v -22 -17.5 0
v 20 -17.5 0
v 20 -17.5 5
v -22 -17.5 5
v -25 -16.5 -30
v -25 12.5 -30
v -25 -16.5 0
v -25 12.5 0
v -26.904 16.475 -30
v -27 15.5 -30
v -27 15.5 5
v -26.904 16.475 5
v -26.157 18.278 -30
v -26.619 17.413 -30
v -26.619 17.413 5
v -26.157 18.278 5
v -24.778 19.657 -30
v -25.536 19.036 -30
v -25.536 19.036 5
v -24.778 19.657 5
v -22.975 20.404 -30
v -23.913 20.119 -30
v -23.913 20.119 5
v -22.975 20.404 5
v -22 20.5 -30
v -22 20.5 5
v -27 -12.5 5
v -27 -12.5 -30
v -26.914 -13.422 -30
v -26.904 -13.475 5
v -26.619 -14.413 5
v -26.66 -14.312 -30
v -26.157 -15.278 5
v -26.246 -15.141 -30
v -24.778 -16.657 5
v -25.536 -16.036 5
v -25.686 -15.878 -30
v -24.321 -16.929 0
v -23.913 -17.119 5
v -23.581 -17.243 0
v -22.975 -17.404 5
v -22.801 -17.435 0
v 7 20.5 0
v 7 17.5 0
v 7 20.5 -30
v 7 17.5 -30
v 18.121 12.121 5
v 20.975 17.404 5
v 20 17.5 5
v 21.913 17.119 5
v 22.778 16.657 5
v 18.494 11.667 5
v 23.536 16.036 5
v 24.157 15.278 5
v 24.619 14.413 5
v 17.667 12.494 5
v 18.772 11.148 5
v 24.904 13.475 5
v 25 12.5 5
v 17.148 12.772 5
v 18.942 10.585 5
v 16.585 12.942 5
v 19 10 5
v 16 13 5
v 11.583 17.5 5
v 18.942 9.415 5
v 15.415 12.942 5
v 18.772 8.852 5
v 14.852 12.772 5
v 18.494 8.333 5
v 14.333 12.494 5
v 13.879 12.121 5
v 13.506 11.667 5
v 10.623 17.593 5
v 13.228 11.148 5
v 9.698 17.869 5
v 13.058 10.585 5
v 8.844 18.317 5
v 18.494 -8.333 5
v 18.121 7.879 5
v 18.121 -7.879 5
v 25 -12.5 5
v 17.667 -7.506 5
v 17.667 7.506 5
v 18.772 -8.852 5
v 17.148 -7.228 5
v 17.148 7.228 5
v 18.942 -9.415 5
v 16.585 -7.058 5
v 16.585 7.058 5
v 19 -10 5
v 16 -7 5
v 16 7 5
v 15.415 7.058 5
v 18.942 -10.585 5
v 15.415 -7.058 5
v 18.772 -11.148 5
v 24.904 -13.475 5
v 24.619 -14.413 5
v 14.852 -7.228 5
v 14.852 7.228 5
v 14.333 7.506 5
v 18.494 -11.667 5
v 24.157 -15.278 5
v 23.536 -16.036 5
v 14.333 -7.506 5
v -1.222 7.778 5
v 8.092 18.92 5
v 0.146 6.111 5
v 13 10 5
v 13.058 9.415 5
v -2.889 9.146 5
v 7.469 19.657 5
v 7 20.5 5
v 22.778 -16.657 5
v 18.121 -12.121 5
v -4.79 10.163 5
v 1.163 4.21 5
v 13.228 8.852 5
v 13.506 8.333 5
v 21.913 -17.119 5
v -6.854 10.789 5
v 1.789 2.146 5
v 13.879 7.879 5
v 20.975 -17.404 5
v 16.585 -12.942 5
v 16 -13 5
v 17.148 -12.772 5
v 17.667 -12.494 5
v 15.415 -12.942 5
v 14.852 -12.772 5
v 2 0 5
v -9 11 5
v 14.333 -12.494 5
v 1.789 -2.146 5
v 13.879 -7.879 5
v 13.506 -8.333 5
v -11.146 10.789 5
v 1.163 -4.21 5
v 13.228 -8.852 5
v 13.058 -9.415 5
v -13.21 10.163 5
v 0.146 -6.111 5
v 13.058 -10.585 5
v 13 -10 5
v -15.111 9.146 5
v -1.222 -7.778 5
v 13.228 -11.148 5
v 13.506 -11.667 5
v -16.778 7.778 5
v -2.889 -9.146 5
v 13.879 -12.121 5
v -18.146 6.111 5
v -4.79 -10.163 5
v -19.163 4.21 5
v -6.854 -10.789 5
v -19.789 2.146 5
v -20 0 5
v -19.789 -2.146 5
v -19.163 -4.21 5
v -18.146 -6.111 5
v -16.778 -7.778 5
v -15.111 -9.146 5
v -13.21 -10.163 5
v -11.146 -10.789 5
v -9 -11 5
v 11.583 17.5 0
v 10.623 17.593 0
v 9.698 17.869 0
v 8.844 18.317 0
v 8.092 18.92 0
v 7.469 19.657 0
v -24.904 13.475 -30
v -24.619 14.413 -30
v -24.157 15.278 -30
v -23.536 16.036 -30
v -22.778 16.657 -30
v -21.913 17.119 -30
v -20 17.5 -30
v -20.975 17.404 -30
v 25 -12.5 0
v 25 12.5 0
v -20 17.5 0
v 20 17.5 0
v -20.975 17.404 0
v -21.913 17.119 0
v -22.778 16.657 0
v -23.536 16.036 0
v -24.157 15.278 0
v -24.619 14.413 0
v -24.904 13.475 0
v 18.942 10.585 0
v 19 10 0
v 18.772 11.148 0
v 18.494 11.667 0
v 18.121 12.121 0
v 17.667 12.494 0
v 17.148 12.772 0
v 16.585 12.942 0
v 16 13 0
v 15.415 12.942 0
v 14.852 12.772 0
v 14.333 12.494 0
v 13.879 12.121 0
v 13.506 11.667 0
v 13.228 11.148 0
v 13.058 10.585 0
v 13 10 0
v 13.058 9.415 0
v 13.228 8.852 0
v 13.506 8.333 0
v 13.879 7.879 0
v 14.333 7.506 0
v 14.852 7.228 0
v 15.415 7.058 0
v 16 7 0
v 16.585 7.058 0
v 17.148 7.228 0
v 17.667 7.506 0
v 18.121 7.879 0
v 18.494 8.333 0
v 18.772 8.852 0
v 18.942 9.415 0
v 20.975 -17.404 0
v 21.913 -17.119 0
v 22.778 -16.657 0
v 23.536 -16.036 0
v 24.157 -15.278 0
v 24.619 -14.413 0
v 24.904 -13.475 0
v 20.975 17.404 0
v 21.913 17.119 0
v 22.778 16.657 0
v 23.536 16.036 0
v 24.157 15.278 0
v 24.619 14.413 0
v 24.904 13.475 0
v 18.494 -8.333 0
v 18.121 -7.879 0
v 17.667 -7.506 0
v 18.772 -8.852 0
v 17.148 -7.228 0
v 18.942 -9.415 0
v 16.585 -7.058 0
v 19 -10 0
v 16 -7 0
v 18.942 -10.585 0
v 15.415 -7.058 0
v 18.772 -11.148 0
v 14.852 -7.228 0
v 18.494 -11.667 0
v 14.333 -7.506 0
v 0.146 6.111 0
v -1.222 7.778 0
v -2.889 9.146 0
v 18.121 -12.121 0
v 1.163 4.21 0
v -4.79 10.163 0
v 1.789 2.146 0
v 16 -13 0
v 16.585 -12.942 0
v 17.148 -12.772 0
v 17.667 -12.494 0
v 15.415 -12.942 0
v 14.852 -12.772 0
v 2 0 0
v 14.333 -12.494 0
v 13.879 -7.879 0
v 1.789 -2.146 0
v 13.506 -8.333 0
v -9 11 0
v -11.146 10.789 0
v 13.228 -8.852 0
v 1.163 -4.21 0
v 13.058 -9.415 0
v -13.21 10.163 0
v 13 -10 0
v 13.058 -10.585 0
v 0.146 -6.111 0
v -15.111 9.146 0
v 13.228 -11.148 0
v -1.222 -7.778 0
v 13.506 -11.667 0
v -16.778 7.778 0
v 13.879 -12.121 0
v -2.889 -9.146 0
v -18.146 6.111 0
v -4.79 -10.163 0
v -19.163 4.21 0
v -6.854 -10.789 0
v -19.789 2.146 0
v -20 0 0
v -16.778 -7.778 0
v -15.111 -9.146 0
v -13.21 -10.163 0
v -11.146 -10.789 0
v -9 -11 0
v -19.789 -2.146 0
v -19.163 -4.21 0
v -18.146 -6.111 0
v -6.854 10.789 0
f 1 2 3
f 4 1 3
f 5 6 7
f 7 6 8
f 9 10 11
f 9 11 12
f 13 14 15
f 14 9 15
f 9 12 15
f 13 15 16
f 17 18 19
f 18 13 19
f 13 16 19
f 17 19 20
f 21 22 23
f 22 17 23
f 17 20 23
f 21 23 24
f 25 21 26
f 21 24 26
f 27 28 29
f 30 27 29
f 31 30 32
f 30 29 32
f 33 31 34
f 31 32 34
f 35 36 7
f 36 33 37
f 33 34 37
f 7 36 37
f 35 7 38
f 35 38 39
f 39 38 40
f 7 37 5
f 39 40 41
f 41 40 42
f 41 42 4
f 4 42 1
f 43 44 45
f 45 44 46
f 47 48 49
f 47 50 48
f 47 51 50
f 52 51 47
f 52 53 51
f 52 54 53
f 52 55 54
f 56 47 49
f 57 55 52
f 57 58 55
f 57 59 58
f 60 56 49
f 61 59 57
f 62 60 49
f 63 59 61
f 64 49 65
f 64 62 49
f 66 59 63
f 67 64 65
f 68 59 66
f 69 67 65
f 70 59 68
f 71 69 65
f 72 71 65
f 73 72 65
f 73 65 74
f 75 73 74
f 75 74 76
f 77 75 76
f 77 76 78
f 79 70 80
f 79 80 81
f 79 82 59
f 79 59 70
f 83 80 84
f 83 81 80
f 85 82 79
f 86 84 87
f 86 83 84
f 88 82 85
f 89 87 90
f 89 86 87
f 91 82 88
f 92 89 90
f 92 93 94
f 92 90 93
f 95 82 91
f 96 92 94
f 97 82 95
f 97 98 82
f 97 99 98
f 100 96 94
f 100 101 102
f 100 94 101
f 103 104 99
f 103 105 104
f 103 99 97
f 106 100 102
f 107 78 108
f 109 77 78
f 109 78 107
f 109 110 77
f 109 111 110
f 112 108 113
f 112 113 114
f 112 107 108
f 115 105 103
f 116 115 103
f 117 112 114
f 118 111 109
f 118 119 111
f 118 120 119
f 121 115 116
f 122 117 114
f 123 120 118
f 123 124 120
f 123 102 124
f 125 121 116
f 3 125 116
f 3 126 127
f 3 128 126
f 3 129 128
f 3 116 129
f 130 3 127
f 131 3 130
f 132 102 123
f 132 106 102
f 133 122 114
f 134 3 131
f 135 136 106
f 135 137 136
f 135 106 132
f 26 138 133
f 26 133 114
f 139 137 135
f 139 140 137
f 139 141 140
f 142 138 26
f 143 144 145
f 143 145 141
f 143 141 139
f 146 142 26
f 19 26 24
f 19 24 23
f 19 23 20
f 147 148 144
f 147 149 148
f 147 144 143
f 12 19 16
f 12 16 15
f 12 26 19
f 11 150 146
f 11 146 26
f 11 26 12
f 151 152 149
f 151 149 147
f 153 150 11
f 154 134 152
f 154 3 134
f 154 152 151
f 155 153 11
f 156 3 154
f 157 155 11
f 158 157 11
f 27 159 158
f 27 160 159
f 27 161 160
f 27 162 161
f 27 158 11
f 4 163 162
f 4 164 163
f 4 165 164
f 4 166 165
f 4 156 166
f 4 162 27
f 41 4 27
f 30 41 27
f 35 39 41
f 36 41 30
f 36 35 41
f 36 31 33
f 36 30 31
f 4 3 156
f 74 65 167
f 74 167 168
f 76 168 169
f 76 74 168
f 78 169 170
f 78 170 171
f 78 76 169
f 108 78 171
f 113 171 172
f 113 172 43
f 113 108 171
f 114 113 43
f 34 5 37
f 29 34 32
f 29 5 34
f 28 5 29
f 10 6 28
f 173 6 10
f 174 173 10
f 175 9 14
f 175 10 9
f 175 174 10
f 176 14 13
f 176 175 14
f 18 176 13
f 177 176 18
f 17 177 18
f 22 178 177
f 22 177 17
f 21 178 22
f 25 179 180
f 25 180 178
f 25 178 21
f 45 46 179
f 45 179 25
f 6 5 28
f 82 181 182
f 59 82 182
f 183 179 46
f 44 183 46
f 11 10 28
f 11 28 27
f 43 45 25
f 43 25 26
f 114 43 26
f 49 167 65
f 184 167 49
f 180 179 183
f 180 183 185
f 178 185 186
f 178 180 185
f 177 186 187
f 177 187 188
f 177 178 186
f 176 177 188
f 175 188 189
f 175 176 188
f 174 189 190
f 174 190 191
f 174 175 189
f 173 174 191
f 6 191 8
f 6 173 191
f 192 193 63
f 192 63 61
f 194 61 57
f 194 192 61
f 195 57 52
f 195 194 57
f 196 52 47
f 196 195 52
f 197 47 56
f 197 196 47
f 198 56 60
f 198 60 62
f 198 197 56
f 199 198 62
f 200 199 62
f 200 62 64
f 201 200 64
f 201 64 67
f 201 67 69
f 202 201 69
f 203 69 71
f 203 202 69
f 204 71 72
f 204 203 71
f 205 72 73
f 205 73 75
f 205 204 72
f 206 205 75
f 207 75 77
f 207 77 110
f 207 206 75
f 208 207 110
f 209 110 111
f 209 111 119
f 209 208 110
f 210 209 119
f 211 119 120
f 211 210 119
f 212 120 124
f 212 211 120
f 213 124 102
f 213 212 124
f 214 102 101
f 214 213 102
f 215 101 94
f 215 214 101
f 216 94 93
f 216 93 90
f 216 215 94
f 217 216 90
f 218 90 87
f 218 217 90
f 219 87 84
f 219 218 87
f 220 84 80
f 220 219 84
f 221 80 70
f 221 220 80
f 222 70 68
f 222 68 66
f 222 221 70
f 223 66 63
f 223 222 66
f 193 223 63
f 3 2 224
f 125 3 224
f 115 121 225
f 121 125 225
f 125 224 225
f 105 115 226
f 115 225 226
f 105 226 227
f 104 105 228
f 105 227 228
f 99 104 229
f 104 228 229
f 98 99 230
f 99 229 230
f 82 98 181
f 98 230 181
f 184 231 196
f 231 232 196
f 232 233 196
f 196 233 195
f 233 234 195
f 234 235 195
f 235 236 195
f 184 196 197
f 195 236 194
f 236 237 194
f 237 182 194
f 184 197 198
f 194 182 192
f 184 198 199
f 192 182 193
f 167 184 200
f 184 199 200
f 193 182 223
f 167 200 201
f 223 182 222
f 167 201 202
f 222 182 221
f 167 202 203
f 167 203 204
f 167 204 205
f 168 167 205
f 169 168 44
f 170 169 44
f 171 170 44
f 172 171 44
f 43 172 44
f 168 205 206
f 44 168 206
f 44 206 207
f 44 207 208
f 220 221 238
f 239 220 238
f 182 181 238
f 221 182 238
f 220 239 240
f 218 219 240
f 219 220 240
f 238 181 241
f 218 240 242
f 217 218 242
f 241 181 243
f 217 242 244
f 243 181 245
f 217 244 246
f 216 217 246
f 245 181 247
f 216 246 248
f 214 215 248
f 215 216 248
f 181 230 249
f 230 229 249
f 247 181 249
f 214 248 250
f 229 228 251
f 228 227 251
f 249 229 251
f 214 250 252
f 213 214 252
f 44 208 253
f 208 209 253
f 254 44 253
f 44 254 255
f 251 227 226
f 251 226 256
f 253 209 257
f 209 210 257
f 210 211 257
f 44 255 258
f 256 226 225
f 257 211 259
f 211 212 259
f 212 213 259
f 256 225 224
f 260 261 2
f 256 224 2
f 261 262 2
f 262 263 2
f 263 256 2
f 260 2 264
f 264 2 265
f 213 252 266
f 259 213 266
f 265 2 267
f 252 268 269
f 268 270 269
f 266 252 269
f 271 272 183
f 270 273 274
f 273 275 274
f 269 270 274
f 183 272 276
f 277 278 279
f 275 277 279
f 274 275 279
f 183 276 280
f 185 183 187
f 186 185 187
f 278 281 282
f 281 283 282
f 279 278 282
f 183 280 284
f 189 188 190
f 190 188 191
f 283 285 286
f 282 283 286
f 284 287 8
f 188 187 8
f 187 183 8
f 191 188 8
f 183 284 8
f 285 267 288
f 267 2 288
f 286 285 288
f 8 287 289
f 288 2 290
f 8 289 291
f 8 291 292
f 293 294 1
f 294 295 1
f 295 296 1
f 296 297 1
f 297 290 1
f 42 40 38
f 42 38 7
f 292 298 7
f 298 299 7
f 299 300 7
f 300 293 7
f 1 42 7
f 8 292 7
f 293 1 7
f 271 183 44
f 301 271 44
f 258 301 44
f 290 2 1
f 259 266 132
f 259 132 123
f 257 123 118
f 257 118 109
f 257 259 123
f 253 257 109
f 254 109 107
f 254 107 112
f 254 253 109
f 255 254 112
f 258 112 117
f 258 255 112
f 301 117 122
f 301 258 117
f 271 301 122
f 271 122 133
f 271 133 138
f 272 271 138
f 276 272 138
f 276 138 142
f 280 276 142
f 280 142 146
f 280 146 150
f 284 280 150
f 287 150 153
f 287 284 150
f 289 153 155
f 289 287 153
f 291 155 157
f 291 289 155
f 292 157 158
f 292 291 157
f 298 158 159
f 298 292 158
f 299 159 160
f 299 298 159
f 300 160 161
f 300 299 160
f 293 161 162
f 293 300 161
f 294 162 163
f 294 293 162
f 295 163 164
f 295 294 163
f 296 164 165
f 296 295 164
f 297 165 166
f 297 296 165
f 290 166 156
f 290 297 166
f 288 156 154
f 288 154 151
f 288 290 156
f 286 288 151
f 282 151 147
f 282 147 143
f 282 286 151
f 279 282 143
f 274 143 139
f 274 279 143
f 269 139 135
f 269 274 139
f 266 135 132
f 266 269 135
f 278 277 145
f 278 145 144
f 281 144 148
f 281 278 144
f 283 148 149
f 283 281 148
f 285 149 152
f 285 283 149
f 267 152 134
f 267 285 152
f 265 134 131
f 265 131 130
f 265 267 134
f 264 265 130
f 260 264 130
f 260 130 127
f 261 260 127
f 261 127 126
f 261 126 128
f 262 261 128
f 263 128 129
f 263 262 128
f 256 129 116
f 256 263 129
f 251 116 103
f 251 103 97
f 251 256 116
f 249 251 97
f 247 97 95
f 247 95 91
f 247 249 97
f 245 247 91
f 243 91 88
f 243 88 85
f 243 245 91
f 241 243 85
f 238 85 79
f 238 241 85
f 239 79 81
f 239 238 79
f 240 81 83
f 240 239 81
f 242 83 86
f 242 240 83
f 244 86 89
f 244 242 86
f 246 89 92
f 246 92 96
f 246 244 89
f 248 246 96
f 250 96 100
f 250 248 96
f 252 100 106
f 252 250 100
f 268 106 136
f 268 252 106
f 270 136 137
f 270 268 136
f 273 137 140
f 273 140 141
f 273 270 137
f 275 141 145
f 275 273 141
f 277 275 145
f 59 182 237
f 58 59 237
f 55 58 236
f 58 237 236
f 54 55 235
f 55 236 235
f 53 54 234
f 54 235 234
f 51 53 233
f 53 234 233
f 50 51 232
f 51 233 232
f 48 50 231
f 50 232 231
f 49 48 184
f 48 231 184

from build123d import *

# Parameters (mm, degrees)
SKETCH1_W           = 50
SKETCH1_H           = 35
SKETCH1_R           = 11
SKETCH1_R_2         = 3
BOSS_EXTRUDE1_DEPTH = 5
SKETCH2_W           = 32
SKETCH2_H           = 30
SKETCH2_H_2         = 5
BOSS_EXTRUDE2_DEPTH = 3
SKETCH3_W           = 35
SKETCH3_H           = 38
BOSS_EXTRUDE3_DEPTH = 2
FILLET1_R           = 5


with BuildPart() as part:
    # Sketch1 → Boss-Extrude1 (new body)
    with BuildSketch(Plane.XY):
        Rectangle(SKETCH1_W, SKETCH1_H)
        with Locations((-9, 0)):
            Circle(SKETCH1_R, mode=Mode.SUBTRACT)
        with Locations(Location((16, -10, 0), (0, 0, 180))):
            Circle(SKETCH1_R_2, mode=Mode.SUBTRACT)
        with Locations((16, 10)):
            Circle(SKETCH1_R_2, mode=Mode.SUBTRACT)
    extrude(amount=BOSS_EXTRUDE1_DEPTH)

    # Sketch2 → Boss-Extrude2 (add)
    with BuildSketch(Plane(origin=(0, 17.5, 0), x_dir=(1, 0, 0), z_dir=(0, 1, 0))):
        with Locations((-9, 15)):
            Rectangle(SKETCH2_W, SKETCH2_H)
        with Locations((-9, -2.5)):
            Rectangle(SKETCH2_W, SKETCH2_H_2)
    extrude(amount=BOSS_EXTRUDE2_DEPTH)

    # Sketch3 → Boss-Extrude3 (add)
    with BuildSketch(Plane.ZY.offset(25)):
        with Locations((-12.5, 1.5)):
            Rectangle(SKETCH3_W, SKETCH3_H)
    extrude(amount=BOSS_EXTRUDE3_DEPTH)

    # Fillet1
    # the kernel refuses this fillet: 5 mm, written as the material it adds along each edge
    with BuildSketch(Plane(origin=(7, 17.5, 5), x_dir=(1, 0, 0), z_dir=(0, 0, -1))) as fillet1_piece_1:
        with BuildLine():
            CenterArc((4.582575695, -5), FILLET1_R, 90, 66.421821522)
            Line((0, -3), (0, 0))
            Line((0, 0), (4.582575695, 0))
        make_face()
    extrude(amount=5)
    with BuildSketch(Plane(origin=(-25, 17.5, -30), x_dir=(0, -1, 0), z_dir=(0, 0, 1))) as fillet1_piece_2:
        with BuildLine():
            CenterArc((FILLET1_R, FILLET1_R), FILLET1_R, 180, 90)
            Line((0, FILLET1_R), (0, 0))
            Line((0, 0), (FILLET1_R, 0))
        make_face()
    extrude(amount=30)
    # the kernel refuses this fillet: 5 mm, written as the material it takes off along each edge
    with BuildSketch(Plane(origin=(25, 17.5, -12.5), x_dir=(-1, 0, 0), z_dir=(0, 0, 1)), Plane(origin=(25, -17.5, -12.5), x_dir=(0, 1, 0), z_dir=(0, 0, 1))) as fillet1_2_piece_1:
        with BuildLine():
            CenterArc((FILLET1_R, FILLET1_R), FILLET1_R, 180, 90)
            Line((0, FILLET1_R), (0, 0))
            Line((0, 0), (FILLET1_R, 0))
        make_face()
    extrude(amount=30, mode=Mode.SUBTRACT)
    with BuildSketch(Plane(origin=(-27, -17.5, -42.5), x_dir=(1, 0, 0), z_dir=(0, 0, 1))) as fillet1_2_piece_2:
        with BuildLine():
            CenterArc((FILLET1_R, FILLET1_R), FILLET1_R, 180, 90)
            Line((0, FILLET1_R), (0, 0))
            Line((0, 0), (FILLET1_R, 0))
        make_face()
    extrude(amount=60, mode=Mode.SUBTRACT)
    with BuildSketch(Plane(origin=(-27, 20.5, 17.5), x_dir=(0, -1, 0), z_dir=(0, 0, -1))) as fillet1_2_piece_3:
        with BuildLine():
            CenterArc((FILLET1_R, -FILLET1_R), FILLET1_R, 90, 90)
            Line((0, -FILLET1_R), (0, 0))
            Line((0, 0), (FILLET1_R, 0))
        make_face()
    extrude(amount=60, mode=Mode.SUBTRACT)


solid = part.part
